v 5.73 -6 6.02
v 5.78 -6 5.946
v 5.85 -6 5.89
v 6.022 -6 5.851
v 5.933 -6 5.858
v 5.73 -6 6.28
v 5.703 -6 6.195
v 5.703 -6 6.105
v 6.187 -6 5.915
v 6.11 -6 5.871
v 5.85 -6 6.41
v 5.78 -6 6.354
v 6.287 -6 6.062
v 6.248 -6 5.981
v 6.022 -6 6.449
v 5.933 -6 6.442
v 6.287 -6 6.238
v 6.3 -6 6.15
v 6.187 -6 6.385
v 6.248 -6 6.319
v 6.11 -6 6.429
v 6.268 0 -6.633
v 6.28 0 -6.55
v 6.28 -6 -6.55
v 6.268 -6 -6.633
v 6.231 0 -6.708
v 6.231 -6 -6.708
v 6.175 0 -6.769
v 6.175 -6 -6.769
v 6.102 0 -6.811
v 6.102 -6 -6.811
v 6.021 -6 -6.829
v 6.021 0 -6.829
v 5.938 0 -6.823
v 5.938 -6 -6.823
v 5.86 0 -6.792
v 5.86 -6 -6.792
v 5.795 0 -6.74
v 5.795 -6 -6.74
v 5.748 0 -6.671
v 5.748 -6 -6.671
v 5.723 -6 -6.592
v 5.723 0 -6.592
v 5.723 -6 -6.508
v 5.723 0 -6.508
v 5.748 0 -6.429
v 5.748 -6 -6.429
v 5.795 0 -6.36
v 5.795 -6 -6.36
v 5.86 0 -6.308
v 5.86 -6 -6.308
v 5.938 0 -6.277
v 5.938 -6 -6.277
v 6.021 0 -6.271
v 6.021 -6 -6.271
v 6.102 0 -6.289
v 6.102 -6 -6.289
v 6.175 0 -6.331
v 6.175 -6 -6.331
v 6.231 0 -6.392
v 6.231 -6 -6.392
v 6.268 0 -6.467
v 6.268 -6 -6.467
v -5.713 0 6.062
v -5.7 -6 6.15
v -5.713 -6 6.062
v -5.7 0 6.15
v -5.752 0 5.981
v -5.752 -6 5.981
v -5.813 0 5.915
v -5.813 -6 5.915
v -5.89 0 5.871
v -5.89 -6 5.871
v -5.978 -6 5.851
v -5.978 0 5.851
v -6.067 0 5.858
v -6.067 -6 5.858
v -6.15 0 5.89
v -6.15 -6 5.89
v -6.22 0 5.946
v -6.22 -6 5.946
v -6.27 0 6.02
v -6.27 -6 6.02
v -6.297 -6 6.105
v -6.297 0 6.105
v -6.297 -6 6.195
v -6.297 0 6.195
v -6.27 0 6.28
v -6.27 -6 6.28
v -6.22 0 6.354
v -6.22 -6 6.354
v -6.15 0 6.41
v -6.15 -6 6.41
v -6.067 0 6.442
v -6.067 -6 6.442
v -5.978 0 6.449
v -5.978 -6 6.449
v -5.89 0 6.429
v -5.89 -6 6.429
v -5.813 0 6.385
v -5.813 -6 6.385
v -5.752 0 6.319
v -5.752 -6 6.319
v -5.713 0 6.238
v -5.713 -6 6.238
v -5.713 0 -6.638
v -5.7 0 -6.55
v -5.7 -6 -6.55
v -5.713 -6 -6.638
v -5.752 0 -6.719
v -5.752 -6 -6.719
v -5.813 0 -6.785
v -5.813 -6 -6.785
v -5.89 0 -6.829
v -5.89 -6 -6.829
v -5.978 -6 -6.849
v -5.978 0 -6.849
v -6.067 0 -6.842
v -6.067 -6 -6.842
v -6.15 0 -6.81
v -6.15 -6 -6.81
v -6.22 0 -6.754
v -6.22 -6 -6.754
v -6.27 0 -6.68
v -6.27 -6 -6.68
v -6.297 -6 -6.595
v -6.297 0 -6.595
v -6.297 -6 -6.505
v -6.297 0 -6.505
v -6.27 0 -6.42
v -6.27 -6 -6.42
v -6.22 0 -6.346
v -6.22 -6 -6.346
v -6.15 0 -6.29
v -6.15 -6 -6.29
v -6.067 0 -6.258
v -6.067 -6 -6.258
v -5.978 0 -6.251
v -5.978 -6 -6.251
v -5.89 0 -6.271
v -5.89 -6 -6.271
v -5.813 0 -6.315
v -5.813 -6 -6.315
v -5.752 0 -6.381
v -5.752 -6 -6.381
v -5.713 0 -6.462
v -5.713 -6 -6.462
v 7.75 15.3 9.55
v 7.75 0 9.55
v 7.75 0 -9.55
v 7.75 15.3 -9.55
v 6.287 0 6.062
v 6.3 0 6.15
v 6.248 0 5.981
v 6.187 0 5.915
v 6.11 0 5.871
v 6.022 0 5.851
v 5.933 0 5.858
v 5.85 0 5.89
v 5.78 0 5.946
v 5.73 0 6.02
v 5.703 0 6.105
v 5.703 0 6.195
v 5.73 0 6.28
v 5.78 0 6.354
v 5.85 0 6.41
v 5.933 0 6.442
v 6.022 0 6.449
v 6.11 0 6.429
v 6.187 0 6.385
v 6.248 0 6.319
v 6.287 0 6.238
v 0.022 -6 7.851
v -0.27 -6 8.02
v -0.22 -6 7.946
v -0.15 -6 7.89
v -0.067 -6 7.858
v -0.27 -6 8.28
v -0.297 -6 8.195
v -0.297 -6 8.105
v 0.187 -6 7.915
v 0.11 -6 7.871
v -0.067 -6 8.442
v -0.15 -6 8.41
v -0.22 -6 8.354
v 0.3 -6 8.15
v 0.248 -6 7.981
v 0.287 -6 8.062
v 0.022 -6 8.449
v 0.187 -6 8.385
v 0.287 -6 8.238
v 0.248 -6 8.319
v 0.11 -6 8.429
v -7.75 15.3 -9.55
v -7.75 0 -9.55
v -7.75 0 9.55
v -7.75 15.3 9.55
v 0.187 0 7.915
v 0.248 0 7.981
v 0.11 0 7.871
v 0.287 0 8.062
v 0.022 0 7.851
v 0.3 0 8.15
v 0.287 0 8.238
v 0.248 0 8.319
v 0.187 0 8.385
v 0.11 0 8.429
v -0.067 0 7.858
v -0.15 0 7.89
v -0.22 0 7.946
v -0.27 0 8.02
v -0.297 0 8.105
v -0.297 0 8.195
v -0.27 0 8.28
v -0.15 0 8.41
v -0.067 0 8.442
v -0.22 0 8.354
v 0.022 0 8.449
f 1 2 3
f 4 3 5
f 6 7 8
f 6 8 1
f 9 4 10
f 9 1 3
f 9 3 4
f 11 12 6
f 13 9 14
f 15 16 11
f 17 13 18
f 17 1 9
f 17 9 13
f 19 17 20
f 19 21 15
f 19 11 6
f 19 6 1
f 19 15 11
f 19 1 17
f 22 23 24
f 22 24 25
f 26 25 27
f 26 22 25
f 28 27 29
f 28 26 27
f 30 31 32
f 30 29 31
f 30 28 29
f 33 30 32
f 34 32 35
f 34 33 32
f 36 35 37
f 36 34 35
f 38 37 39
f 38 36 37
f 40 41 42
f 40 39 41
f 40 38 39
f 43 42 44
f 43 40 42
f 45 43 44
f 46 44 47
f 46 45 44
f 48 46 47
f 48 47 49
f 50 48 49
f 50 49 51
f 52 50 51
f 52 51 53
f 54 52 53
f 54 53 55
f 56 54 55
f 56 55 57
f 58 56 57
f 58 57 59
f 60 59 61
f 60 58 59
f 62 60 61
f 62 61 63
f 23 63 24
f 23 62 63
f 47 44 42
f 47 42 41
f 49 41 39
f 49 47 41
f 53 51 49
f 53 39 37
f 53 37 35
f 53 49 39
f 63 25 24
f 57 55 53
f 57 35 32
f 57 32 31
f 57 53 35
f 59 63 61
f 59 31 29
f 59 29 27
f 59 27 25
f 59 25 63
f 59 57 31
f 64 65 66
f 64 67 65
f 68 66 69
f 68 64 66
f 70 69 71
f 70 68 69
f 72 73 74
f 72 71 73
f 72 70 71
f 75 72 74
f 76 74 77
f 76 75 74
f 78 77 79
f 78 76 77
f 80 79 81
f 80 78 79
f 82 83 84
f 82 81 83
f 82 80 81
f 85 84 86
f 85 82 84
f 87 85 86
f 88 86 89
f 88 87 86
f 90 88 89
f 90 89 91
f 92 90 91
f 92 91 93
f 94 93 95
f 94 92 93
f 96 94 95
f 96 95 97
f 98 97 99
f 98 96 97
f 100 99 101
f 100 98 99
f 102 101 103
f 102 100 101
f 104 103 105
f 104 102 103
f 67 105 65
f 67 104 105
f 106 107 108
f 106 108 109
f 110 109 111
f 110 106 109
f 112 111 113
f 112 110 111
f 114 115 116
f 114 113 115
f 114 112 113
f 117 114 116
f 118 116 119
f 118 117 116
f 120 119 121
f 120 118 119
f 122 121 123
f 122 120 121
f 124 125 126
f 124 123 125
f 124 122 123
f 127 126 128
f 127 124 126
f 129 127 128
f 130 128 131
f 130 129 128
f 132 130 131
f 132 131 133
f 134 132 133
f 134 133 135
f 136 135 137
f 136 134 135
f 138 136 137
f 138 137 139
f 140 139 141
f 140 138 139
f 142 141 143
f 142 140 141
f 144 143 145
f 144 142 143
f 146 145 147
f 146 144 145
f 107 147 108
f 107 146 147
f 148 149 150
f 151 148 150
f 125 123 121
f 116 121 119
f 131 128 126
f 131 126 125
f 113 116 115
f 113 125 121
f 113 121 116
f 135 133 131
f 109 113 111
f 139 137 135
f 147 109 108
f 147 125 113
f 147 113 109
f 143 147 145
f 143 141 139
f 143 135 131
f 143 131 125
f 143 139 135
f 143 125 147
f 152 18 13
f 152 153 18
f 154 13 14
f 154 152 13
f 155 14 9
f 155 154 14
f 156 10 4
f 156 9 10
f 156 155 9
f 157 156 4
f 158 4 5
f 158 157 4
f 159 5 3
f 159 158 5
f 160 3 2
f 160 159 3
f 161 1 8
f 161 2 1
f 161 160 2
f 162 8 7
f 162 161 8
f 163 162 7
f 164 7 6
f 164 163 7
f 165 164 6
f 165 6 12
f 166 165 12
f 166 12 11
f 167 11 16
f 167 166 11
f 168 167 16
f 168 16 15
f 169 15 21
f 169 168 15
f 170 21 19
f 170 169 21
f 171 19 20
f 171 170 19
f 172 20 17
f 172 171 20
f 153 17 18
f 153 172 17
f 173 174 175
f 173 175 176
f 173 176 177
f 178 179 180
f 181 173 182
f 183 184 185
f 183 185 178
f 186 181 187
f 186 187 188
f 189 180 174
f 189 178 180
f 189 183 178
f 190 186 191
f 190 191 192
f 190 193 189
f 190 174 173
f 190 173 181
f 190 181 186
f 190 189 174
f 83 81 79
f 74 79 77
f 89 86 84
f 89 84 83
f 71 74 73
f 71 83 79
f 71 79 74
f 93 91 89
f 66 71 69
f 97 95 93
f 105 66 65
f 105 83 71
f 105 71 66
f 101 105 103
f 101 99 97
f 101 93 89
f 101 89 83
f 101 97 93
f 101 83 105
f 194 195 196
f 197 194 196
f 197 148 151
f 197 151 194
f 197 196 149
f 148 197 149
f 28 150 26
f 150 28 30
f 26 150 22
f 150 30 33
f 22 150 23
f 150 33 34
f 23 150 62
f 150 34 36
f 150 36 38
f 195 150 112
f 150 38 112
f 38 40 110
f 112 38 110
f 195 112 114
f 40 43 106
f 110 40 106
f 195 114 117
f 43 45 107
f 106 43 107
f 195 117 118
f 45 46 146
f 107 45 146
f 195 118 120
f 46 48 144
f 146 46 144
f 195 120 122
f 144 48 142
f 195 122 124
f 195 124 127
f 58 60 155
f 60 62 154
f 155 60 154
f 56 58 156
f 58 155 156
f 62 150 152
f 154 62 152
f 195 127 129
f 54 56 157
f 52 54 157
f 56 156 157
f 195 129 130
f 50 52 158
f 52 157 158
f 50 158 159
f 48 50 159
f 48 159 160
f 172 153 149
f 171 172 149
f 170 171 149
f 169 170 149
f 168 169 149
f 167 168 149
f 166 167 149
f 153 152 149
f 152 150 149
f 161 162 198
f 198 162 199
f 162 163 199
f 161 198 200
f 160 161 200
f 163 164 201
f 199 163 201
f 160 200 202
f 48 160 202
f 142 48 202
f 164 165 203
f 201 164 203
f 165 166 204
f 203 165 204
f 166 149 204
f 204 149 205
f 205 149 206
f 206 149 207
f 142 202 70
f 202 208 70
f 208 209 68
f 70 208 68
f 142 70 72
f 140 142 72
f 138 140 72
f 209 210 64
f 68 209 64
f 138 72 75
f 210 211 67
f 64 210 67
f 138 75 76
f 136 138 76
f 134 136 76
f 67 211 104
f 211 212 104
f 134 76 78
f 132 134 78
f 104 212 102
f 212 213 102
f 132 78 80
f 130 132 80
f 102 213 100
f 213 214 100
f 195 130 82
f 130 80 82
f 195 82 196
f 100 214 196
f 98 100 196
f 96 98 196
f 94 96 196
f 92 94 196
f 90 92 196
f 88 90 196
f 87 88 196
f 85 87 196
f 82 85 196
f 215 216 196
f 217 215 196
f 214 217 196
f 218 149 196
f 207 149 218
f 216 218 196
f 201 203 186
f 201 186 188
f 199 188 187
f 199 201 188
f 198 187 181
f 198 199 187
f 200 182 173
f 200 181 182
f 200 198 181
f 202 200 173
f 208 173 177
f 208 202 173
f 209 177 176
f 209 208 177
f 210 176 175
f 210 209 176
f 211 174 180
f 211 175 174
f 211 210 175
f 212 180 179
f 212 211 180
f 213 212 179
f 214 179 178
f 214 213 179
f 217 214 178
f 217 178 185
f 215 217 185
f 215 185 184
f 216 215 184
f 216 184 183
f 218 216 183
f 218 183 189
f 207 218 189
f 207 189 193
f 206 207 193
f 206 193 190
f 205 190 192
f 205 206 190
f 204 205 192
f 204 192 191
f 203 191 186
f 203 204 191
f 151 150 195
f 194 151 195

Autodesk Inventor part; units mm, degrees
ref_plane "YZ Plane" through (0, 0, 0) normal (1, 0, 0) x (0, 1, 0)
ref_plane "XZ Plane" through (0, 0, 0) normal (0, 1, 0) x (-1, 0, 0)
ref_plane "XY Plane" through (0, 0, 0) normal (0, 0, 1) x (1, 0, 0)
sketch "Sketch1" plane through (0, 0, 0) normal (0, 1, 0) x (-1, 0, 0)
  line L0 (7.75, 9.55) -> (-7.75, 9.55)
  line L1 (-7.75, 9.55) -> (-7.75, -9.55)
  line L2 (-7.75, -9.55) -> (7.75, -9.55)
  line L3 (7.75, -9.55) -> (7.75, 9.55)
  line L4 (7.75, 9.55) -> (-7.75, -9.55) construction
  line L5 (-7.75, 9.55) -> (7.75, -9.55) construction
  point P0 (0, 0)
  dimension "d0" = 15.5
  dimension "d1" = 19.1
extrude "Extrusion1" add sketch "Sketch1" along normal blind 15.3
sketch "Sketch2" plane through (0, 0, 0) normal (0, -1, 0) x (1, 0, 0)
  line L0 (7.75, 9.55) -> (7.75, -9.55) projected
  line L1 (-7.75, 9.55) -> (7.75, 9.55) projected
  line L2 (-7.75, -9.55) -> (-7.75, 9.55) projected
  line L3 (7.75, -9.55) -> (-7.75, -9.55) projected
  circle A0 centre (-6, 6.15) radius 0.3
  circle A1 centre (6, 6.15) radius 0.3
  circle A2 centre (0, 8.15) radius 0.3
  circle A3 centre (-6, -6.55) radius 0.3
  circle A4 centre (6, -6.55) radius 0.28
  point P0 (0, 0)
  dimension "d4" = 0.6
  dimension "d5" = 0.6
  dimension "d6" = 0.6
  dimension "d9" = 6
  dimension "d10" = 6
  dimension "d11" = 0.6
  dimension "d12" = 0.56
  dimension "d13" = 2
  dimension "d14" = 1.4
  dimension "d15" = 2
  dimension "d18" = 12.7
  dimension "d19" = 12.7
extrude "Extrusion2" add sketch "Sketch2" along normal blind 6 contours A0 | A1 | A2 | A3 | A4
properties part number "relay_sdr-03vdc-sl-c" material "ABS Plastic"
